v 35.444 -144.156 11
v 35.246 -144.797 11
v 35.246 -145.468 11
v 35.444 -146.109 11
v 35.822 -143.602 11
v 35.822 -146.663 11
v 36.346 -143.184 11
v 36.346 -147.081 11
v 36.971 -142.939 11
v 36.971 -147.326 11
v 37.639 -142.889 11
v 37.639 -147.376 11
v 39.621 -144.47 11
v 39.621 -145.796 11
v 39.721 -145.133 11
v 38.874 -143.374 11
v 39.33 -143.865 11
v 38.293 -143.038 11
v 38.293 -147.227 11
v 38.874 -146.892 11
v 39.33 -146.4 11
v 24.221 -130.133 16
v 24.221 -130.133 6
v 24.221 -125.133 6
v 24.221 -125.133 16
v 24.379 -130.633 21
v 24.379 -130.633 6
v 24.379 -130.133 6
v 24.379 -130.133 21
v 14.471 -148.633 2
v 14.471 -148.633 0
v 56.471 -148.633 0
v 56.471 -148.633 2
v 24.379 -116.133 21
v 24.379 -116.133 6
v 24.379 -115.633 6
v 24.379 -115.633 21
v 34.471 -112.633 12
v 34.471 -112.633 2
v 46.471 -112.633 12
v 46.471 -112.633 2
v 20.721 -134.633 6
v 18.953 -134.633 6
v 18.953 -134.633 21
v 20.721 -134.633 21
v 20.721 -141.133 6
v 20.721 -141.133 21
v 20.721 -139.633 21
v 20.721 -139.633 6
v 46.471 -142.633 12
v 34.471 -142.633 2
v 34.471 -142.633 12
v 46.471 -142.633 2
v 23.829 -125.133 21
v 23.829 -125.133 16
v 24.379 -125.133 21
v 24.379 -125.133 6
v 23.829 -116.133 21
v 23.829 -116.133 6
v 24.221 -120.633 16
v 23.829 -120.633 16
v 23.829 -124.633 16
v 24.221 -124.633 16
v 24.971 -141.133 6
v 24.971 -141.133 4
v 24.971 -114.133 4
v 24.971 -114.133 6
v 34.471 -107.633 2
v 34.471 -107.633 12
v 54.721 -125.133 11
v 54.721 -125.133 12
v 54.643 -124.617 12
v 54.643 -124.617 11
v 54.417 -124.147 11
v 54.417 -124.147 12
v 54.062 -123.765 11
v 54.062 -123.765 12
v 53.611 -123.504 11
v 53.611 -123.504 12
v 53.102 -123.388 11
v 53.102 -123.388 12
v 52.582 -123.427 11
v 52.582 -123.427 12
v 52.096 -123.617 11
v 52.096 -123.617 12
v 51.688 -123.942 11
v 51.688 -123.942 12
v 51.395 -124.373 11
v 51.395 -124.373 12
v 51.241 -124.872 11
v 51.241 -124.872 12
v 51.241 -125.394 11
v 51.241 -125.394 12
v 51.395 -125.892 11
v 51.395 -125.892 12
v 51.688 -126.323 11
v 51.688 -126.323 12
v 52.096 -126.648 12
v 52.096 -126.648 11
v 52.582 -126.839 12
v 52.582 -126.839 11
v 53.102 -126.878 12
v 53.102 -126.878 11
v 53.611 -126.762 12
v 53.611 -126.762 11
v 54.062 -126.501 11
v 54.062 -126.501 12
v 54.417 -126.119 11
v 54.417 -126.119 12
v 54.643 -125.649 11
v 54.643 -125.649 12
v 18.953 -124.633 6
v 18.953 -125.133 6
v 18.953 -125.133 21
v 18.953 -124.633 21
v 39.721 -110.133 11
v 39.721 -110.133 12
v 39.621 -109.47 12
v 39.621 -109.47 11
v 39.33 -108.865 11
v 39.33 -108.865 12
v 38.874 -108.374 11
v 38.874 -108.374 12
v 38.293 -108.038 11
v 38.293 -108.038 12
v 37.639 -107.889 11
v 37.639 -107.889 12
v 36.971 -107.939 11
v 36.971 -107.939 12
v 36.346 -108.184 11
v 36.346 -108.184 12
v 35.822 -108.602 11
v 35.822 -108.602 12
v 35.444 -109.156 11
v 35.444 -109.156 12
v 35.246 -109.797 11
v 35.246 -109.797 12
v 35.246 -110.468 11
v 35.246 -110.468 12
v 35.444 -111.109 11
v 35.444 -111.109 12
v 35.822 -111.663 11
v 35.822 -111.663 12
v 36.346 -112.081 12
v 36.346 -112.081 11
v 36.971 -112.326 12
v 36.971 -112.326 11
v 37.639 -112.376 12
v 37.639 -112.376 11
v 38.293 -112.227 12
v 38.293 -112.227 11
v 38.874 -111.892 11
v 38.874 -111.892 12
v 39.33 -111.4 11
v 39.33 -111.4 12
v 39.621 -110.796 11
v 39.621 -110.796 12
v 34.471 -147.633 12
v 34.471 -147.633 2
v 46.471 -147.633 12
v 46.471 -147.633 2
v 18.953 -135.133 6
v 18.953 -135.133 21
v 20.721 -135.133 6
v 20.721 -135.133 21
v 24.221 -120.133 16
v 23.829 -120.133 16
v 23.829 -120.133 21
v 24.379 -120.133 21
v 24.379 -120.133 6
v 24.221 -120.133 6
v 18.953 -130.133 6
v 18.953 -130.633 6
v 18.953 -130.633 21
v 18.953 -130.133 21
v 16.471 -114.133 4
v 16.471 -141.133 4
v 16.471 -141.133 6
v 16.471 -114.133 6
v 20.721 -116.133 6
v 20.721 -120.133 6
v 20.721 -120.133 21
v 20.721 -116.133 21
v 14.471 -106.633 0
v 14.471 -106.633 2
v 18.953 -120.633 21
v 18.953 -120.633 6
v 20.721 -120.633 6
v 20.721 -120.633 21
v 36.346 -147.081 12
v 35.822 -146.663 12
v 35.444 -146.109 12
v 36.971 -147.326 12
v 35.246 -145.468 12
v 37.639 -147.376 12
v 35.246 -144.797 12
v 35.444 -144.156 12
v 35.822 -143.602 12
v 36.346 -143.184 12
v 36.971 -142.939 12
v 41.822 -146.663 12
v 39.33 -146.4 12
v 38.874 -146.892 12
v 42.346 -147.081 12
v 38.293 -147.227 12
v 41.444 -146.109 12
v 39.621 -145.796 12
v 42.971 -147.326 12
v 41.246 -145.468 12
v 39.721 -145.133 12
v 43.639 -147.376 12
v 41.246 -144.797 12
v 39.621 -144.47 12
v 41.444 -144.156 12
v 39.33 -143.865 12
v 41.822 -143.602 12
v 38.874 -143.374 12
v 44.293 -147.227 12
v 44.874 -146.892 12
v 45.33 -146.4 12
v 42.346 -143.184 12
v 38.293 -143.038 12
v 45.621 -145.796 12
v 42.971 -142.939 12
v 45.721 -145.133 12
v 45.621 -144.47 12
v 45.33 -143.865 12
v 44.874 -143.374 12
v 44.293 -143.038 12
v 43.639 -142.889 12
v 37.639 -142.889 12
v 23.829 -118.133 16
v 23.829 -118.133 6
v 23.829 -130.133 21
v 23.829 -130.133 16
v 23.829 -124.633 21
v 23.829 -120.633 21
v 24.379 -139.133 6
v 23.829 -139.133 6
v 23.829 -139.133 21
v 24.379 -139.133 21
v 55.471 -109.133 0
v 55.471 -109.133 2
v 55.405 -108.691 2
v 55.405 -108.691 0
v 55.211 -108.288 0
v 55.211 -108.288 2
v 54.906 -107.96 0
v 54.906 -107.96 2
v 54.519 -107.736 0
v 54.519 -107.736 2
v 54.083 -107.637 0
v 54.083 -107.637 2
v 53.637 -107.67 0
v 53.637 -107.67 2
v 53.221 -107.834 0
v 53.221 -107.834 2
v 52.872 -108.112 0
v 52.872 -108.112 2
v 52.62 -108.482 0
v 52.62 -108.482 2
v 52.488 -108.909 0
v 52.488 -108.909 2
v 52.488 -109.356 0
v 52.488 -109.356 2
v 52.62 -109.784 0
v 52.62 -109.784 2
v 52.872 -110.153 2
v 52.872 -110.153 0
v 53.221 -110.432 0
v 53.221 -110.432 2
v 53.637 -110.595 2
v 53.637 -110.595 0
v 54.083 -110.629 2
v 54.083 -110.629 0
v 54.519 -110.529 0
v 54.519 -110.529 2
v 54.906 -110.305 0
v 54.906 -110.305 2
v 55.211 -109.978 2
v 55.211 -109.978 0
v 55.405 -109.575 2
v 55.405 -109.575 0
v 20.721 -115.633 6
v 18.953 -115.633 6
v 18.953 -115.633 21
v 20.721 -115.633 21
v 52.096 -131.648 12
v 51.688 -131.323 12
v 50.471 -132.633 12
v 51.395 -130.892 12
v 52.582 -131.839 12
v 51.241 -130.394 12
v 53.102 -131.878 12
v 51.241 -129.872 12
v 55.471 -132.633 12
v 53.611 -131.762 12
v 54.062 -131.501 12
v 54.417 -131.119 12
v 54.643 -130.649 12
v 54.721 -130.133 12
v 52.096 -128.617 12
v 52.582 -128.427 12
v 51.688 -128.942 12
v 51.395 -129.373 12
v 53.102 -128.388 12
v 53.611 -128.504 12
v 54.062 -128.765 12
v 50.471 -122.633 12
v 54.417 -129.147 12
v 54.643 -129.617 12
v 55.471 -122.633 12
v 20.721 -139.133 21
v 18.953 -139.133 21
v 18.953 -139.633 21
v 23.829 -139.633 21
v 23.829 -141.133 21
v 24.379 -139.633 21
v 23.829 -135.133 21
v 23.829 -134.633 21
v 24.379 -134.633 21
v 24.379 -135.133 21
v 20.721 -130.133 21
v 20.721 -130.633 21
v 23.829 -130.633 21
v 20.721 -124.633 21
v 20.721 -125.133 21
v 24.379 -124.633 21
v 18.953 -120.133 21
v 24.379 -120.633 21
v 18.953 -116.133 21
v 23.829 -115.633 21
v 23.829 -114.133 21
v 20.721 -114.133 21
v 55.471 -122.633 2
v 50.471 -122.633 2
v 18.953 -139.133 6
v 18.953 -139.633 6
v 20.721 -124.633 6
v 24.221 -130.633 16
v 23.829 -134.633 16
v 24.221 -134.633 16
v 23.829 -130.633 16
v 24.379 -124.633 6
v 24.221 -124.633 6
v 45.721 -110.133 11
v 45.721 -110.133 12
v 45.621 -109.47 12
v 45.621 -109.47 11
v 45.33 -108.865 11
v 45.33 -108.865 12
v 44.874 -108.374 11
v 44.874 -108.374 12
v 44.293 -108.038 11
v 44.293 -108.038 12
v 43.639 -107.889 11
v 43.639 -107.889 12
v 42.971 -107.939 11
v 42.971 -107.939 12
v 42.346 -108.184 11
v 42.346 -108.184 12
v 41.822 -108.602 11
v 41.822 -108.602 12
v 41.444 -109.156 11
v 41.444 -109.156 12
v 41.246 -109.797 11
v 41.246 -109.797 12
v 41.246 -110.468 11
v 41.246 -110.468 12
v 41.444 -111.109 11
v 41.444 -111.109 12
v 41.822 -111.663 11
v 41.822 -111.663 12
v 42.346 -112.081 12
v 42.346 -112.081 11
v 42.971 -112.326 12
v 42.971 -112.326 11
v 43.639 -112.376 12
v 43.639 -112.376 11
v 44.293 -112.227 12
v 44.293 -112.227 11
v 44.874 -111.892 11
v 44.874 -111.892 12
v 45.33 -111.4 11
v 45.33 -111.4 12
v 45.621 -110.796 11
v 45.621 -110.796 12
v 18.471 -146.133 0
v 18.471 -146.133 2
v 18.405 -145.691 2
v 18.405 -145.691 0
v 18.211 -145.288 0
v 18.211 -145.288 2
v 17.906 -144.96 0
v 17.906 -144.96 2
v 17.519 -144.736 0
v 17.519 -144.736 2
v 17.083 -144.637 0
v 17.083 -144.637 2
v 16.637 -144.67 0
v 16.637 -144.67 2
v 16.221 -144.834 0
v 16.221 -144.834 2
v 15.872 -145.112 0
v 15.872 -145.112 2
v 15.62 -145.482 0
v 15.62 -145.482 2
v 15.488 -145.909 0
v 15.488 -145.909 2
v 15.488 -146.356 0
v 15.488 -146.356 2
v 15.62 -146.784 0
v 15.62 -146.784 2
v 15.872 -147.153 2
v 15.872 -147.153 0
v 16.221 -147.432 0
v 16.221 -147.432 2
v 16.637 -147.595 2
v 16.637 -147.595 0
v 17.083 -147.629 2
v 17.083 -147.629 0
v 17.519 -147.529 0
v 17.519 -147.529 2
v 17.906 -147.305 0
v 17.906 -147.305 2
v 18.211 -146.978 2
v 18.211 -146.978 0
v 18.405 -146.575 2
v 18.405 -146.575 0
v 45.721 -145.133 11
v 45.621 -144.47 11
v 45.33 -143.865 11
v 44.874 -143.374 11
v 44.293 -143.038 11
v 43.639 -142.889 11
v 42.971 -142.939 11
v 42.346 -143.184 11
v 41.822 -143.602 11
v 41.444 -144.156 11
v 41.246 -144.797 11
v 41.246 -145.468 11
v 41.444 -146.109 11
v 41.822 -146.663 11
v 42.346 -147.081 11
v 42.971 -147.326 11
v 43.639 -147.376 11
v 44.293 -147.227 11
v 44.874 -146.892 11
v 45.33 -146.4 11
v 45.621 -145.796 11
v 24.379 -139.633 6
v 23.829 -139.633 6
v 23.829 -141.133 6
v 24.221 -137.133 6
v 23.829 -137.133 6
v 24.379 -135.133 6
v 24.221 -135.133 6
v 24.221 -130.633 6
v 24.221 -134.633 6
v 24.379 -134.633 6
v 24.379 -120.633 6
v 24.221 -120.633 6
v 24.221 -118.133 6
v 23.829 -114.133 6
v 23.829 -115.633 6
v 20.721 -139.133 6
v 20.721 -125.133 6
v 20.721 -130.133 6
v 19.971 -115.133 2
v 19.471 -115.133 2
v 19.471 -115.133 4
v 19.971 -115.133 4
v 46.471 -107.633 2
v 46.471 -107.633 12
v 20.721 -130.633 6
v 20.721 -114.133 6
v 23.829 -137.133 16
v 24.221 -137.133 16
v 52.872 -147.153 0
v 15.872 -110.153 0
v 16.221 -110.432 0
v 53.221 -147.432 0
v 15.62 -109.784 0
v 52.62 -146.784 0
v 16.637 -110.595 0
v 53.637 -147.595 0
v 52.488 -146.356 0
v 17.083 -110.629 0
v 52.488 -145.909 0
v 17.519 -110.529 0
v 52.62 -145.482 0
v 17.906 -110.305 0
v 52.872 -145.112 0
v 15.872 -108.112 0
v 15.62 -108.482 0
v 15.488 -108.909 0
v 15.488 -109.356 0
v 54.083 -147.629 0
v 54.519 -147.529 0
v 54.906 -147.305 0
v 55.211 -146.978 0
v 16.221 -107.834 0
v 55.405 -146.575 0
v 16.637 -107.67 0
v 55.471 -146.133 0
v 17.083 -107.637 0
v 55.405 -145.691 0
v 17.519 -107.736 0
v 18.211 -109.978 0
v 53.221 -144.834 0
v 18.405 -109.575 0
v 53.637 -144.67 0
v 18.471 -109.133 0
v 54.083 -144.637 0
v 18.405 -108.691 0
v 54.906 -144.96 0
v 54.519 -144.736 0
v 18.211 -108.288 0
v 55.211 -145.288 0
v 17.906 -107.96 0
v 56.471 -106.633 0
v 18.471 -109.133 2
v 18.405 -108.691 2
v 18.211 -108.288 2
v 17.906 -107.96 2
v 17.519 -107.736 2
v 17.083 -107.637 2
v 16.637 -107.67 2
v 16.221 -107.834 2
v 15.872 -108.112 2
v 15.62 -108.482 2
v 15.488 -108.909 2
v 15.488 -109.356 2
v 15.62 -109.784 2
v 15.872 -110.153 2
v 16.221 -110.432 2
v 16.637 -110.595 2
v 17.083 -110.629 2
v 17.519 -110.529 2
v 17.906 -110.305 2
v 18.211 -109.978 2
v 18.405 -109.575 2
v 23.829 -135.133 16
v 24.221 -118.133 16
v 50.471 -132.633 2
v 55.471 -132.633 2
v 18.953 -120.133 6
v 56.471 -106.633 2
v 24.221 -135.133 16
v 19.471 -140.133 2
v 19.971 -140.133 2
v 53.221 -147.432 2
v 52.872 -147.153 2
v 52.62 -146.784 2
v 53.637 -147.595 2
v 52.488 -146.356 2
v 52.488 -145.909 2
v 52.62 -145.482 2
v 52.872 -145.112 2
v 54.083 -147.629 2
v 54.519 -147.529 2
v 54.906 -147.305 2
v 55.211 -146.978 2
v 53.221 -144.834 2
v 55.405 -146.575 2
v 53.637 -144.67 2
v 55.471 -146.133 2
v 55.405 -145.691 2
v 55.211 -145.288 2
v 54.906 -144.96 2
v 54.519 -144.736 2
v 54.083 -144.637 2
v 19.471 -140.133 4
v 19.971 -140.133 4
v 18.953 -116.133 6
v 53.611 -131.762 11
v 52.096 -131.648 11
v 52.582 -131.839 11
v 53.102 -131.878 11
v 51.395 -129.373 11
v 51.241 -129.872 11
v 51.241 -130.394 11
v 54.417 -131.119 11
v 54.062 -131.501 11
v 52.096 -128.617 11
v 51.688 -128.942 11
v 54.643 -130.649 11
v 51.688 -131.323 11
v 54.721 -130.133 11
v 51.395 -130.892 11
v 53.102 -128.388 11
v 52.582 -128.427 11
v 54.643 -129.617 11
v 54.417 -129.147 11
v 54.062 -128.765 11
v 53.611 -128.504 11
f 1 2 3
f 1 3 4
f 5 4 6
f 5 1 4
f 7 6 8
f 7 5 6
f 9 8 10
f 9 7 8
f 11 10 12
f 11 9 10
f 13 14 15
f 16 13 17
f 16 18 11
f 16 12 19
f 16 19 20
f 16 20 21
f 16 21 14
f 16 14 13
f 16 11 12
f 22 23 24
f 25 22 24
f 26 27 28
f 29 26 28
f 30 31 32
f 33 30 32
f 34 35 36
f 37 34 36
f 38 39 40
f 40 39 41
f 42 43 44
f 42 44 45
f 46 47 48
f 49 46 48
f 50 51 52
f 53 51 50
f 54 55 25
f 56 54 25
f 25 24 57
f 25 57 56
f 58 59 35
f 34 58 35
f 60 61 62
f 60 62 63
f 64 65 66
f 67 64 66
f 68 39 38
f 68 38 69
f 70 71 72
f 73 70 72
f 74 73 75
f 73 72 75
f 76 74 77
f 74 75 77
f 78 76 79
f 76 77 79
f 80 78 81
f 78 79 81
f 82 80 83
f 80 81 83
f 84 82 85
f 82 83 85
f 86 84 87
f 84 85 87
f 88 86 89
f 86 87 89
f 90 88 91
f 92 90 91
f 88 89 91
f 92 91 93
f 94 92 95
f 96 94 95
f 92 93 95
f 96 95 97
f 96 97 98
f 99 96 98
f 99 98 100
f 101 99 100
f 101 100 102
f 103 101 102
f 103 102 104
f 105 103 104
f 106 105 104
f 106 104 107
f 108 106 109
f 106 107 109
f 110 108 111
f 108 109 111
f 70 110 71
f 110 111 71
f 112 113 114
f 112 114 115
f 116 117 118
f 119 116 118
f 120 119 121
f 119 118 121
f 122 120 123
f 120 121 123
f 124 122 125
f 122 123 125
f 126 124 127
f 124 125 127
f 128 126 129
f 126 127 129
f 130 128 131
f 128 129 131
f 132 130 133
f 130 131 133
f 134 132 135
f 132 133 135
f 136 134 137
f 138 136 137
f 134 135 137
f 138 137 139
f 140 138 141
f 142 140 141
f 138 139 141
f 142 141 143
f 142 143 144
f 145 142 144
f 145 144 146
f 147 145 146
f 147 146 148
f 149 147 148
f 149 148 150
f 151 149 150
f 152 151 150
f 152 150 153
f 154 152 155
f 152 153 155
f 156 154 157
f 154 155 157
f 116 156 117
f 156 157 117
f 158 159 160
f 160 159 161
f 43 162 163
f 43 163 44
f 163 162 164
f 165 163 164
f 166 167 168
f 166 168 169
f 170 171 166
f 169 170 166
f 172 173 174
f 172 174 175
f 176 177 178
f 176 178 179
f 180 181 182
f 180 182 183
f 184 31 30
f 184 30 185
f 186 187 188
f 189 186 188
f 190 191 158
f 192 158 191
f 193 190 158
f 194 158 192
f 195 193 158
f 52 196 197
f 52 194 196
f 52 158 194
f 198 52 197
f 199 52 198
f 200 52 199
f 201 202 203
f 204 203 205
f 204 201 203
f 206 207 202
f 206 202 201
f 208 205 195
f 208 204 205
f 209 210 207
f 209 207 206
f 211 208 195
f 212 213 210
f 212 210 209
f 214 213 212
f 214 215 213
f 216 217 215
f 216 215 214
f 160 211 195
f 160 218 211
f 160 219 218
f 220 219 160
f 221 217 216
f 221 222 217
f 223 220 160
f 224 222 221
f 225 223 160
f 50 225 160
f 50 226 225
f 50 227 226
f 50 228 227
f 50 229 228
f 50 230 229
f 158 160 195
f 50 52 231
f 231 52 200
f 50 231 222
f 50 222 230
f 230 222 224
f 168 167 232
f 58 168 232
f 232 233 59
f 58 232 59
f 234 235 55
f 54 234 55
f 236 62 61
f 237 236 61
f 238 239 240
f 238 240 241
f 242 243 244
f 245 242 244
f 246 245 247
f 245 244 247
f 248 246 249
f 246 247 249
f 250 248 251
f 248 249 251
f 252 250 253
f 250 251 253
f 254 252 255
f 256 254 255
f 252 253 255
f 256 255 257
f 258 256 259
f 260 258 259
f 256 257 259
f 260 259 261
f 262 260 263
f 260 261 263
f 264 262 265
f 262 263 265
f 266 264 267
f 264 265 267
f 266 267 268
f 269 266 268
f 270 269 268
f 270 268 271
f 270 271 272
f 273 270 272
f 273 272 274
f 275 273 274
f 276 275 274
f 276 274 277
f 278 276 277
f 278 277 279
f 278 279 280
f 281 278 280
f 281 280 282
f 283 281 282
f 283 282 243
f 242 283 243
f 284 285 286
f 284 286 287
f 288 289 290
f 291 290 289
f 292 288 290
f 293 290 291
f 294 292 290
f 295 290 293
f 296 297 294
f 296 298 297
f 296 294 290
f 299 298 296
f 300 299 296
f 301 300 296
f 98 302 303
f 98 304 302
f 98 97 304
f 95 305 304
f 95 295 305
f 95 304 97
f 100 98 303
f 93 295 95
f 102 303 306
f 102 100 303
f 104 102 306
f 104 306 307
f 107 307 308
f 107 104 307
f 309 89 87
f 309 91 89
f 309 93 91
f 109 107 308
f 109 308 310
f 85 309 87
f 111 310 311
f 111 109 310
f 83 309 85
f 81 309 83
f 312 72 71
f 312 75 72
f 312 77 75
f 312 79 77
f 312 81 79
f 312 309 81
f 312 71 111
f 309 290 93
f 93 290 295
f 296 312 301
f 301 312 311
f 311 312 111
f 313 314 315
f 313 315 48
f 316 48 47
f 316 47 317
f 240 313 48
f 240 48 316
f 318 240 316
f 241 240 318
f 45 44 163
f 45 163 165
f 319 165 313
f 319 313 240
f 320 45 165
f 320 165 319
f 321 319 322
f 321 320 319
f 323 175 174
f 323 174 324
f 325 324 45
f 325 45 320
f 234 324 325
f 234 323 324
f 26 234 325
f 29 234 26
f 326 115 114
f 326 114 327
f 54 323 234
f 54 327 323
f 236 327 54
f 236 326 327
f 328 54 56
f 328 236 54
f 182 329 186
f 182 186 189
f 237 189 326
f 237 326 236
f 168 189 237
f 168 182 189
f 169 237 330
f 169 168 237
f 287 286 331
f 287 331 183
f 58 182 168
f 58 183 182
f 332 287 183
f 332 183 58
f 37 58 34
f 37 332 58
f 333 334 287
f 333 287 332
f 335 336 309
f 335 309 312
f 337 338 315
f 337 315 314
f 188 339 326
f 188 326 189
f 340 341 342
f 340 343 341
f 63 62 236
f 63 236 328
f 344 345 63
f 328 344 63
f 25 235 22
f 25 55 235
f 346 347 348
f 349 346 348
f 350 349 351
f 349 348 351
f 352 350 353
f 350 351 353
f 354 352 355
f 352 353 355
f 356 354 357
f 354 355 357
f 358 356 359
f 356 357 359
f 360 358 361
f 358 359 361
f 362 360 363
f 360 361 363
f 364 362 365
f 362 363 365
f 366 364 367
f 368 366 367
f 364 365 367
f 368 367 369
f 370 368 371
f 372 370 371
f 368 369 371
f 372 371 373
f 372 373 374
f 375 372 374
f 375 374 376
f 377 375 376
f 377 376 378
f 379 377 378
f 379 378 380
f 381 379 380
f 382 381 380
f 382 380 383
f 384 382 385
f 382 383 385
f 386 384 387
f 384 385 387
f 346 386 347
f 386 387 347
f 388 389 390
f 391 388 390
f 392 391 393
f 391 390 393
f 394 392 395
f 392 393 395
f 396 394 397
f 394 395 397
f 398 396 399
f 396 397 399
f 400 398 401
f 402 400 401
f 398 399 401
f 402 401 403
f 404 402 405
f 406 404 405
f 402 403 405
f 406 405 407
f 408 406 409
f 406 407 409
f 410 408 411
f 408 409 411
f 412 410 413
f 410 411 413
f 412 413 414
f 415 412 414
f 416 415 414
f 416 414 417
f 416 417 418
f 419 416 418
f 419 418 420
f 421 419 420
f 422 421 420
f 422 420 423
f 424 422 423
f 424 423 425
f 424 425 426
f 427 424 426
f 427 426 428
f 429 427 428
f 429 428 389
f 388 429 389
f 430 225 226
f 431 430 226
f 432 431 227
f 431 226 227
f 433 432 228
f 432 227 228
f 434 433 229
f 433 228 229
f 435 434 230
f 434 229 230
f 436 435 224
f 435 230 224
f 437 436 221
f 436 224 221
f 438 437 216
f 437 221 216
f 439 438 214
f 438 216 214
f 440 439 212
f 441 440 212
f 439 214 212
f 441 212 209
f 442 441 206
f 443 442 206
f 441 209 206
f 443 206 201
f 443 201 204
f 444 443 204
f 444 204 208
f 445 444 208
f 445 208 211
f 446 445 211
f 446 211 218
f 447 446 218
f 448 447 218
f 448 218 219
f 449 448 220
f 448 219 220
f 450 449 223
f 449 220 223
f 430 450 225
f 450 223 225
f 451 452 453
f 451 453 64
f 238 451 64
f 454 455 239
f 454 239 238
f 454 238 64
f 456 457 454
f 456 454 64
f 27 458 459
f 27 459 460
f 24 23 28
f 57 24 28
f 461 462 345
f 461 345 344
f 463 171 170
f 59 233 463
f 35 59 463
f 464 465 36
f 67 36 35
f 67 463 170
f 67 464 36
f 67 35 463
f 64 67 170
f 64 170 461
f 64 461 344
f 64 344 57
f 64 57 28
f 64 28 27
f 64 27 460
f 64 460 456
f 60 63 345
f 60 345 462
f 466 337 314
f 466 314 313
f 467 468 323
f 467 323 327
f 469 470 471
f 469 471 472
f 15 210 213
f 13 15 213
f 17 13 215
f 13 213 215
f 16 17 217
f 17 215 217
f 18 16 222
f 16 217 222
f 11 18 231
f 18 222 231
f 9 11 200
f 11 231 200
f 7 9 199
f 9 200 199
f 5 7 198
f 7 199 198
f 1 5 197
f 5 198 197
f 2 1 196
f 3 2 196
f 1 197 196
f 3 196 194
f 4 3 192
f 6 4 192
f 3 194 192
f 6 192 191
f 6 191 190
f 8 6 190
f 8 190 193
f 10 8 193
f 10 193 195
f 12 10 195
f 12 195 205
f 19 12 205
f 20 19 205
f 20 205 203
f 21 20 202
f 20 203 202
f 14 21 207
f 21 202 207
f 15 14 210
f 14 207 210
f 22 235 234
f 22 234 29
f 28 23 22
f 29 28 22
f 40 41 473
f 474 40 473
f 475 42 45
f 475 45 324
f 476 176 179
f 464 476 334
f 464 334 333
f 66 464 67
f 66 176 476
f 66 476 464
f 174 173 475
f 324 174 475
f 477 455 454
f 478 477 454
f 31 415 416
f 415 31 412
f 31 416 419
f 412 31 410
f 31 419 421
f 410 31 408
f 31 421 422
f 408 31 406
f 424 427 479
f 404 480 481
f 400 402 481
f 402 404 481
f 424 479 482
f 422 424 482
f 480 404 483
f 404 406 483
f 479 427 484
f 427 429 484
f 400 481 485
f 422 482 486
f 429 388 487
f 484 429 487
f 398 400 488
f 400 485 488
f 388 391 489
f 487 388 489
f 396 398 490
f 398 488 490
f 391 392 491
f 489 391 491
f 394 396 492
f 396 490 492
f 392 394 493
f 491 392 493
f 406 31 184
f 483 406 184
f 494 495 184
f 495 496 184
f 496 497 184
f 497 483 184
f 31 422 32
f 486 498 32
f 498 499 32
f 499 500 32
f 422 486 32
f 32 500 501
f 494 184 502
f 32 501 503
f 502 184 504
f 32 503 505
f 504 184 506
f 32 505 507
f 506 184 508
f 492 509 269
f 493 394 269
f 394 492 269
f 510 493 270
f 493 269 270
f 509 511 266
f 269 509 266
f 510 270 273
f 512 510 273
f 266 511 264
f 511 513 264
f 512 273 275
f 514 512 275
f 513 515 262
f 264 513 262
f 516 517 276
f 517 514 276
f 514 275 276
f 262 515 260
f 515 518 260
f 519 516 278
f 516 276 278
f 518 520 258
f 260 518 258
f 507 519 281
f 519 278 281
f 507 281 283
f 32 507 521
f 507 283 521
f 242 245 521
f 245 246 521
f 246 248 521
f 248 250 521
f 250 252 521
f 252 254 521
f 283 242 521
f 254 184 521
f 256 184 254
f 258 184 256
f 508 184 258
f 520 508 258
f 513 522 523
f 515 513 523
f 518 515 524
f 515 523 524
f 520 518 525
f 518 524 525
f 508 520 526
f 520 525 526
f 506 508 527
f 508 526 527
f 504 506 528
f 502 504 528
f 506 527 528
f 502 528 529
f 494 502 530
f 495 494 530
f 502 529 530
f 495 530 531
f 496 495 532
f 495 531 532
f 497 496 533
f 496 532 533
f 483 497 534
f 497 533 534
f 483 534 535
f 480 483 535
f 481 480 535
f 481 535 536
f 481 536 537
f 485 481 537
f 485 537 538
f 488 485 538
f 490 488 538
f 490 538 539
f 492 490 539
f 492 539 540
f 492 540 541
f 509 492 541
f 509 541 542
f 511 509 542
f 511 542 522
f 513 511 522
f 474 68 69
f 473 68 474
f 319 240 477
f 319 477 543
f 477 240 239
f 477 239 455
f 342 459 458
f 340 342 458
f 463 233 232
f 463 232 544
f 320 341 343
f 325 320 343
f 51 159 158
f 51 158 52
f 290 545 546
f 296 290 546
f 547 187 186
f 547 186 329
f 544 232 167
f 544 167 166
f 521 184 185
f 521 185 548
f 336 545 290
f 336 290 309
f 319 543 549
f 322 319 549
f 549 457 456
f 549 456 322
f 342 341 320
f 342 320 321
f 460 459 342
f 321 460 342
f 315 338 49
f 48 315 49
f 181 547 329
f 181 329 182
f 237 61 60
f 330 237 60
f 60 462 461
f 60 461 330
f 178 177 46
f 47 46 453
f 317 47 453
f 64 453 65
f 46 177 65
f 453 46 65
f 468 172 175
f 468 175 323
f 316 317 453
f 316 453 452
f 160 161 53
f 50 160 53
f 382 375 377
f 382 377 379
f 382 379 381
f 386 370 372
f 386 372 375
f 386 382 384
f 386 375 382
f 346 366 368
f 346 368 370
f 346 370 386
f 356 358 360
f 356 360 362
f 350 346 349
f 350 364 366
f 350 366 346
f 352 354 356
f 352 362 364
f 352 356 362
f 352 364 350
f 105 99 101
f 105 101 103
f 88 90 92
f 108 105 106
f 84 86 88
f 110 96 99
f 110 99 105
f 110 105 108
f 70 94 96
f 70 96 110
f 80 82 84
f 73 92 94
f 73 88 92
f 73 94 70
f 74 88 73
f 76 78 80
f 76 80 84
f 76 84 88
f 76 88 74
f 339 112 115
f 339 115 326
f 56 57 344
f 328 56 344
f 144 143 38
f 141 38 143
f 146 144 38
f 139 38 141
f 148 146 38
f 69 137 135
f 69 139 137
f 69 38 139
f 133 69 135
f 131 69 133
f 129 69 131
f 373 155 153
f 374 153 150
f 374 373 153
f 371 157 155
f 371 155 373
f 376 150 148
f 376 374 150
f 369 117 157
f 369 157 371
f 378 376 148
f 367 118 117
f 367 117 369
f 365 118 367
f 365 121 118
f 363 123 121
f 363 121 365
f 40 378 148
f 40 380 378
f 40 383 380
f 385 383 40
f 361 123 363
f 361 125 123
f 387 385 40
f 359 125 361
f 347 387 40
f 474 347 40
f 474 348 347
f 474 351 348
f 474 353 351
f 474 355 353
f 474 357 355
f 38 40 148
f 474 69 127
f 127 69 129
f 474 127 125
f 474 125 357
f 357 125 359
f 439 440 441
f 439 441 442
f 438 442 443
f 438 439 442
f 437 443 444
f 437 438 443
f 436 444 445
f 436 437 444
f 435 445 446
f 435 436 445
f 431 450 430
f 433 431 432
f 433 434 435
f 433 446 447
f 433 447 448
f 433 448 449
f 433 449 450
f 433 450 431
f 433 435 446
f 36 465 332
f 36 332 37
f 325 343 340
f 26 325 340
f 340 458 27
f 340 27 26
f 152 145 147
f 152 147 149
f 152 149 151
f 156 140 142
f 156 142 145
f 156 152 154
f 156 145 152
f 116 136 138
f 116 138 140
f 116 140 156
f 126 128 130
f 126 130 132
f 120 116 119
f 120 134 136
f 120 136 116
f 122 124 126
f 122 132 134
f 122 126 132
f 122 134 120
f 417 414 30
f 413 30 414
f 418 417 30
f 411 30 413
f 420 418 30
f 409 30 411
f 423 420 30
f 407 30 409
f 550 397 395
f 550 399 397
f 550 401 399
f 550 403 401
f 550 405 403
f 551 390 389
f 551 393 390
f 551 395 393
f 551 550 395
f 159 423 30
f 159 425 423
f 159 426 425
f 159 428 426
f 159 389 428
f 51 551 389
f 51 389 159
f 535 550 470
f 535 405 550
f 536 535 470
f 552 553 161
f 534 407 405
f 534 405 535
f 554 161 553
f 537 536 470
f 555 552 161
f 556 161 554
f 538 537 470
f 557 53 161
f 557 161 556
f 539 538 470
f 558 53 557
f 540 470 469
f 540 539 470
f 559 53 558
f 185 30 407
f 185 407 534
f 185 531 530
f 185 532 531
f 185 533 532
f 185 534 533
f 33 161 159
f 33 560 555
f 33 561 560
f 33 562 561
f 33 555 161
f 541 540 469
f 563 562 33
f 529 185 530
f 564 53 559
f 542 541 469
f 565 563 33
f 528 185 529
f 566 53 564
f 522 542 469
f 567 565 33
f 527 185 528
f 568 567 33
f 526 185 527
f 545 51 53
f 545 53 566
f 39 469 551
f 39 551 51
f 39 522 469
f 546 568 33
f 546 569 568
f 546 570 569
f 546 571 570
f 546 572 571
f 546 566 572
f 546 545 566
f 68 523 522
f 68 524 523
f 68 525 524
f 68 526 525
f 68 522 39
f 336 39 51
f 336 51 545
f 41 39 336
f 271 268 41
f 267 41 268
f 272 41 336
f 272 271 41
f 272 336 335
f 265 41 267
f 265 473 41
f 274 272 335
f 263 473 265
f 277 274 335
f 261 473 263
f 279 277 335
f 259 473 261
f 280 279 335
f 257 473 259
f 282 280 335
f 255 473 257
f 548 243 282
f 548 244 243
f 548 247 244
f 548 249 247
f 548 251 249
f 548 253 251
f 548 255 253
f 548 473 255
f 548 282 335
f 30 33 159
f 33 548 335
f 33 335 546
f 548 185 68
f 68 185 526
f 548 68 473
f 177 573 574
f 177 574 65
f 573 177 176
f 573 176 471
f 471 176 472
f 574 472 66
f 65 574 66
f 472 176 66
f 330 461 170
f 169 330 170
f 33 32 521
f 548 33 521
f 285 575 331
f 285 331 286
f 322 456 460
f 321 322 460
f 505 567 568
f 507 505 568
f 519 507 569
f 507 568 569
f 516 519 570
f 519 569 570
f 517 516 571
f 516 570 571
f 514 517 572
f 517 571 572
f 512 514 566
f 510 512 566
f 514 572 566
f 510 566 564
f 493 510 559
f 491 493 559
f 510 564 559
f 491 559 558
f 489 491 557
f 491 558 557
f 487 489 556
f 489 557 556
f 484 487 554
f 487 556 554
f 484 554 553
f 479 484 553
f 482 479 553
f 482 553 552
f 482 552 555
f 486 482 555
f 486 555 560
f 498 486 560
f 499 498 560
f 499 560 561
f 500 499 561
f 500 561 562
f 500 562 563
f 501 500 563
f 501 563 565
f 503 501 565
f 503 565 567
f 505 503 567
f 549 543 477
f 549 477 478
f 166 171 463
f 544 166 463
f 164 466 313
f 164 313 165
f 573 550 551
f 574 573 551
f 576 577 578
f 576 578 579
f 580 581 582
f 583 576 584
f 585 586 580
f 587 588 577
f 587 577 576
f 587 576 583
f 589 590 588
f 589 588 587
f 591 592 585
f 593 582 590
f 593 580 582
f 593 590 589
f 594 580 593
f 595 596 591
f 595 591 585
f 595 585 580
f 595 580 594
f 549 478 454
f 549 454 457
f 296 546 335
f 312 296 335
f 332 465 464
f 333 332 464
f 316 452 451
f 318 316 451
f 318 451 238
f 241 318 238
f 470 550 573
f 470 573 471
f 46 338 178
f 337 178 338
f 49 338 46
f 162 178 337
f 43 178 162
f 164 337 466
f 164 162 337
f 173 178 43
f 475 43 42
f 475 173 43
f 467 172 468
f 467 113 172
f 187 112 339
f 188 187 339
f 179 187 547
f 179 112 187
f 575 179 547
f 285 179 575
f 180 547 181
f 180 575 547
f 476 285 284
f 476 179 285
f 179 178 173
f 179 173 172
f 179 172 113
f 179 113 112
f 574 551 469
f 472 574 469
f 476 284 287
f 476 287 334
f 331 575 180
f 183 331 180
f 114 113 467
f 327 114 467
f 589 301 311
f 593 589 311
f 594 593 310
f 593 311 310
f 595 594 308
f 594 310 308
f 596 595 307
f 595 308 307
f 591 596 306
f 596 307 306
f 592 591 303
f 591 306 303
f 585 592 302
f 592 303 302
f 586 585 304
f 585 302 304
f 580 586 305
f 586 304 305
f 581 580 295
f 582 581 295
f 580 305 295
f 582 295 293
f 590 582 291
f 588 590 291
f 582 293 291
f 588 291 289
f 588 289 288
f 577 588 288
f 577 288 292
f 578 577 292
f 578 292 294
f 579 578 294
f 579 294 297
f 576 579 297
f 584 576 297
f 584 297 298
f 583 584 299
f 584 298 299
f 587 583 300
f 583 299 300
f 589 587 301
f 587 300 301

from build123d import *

# Parameters (mm, degrees)
SKETCH1_W           = 42
SKETCH1_H           = 42
BOSS_EXTRUDE1_DEPTH = 2
SKETCH2_W           = 0.5
SKETCH2_H           = 25
BOSS_EXTRUDE2_DEPTH = 2
SKETCH4_W           = 8.5
SKETCH4_H           = 27
BOSS_EXTRUDE3_DEPTH = 2
SKETCH5_W           = 5.42648105
SKETCH5_H           = 0.5
BOSS_EXTRUDE4_DEPTH = 15
SKETCH6_W           = 3.107576182
SKETCH6_H           = 27
BOSS_EXTRUDE5_DEPTH = 15
SKETCH7_W           = 2.5
SKETCH7_H           = 19
BOSS_EXTRUDE6_DEPTH = 10
SKETCH8_W           = 12
SKETCH8_H           = 5
SKETCH8_W_2         = 5
SKETCH8_H_2         = 10
BOSS_EXTRUDE7_DEPTH = 10
SKETCH9_R           = 2.25
SKETCH9_R_2         = 1.75
CUT_EXTRUDE1_DEPTH  = 1
SKETCH10_R          = 1.5
CUT_EXTRUDE2_DEPTH  = 3


with BuildPart() as part:
    # Sketch1 → Boss-Extrude1 (new body)
    with BuildSketch(Plane.XY):
        with Locations((35.471214637, -127.632705913)):
            Rectangle(SKETCH1_W, SKETCH1_H)
    extrude(amount=BOSS_EXTRUDE1_DEPTH)

    # Sketch2 → Boss-Extrude2 (add)
    with BuildSketch(Plane.XY.offset(2)):
        with Locations((19.721214637, -127.632705913)):
            Rectangle(SKETCH2_W, SKETCH2_H)
    extrude(amount=BOSS_EXTRUDE2_DEPTH)

    # Sketch4 → Boss-Extrude3 (add)
    with BuildSketch(Plane.XY.offset(4)):
        with Locations((20.721214637, -127.632705913)):
            Rectangle(SKETCH4_W, SKETCH4_H)
    extrude(amount=BOSS_EXTRUDE3_DEPTH)

    # Sketch5 → Boss-Extrude4 (add)
    with BuildSketch(Plane.XY.offset(6)):
        with Locations((21.665849022, -115.882705913)):
            Rectangle(SKETCH5_W, SKETCH5_H)
        with Locations((21.665849022, -120.382705913)):
            Rectangle(SKETCH5_W, SKETCH5_H)
        with Locations((21.665849022, -124.882705913)):
            Rectangle(SKETCH5_W, SKETCH5_H)
        with Locations((21.665849022, -130.382705913)):
            Rectangle(SKETCH5_W, SKETCH5_H)
        with Locations((21.665849022, -134.882705913)):
            Rectangle(SKETCH5_W, SKETCH5_H)
        with Locations((21.665849022, -139.382705913)):
            Rectangle(SKETCH5_W, SKETCH5_H)
    extrude(amount=BOSS_EXTRUDE4_DEPTH)

    # Sketch6 → Boss-Extrude5 (add)
    with BuildSketch(Plane.XY.offset(6)):
        with Locations((22.275002728, -127.632705913)):
            Rectangle(SKETCH6_W, SKETCH6_H)
    extrude(amount=BOSS_EXTRUDE5_DEPTH)

    # Sketch7 → Boss-Extrude6 (add)
    with BuildSketch(Plane.XY.offset(6)):
        with Locations((22.971214637, -127.632705913)):
            Rectangle(SKETCH7_W, SKETCH7_H)
    extrude(amount=BOSS_EXTRUDE6_DEPTH)

    # Sketch8 → Boss-Extrude7 (add)
    with BuildSketch(Plane.XY.offset(2)):
        with Locations((40.471214637, -110.132705913)):
            Rectangle(SKETCH8_W, SKETCH8_H)
        with Locations((40.471214637, -145.132705913)):
            Rectangle(SKETCH8_W, SKETCH8_H)
        with Locations((52.971214637, -127.632705913)):
            Rectangle(SKETCH8_W_2, SKETCH8_H_2)
    extrude(amount=BOSS_EXTRUDE7_DEPTH)

    # Sketch9 → Cut-Extrude1 (cut)
    with BuildSketch(Plane.XY.offset(12)):
        with Locations((37.471214637, -110.132705913)):
            Circle(SKETCH9_R)
        with Locations((43.471214637, -110.132705913)):
            Circle(SKETCH9_R)
        with Locations((52.971214637, -125.132705913)):
            Circle(SKETCH9_R_2)
        with Locations((52.971214637, -130.132705913)):
            Circle(SKETCH9_R_2)
        with Locations((43.471214637, -145.132705913)):
            Circle(SKETCH9_R)
        with Locations((37.471214637, -145.132705913)):
            Circle(SKETCH9_R)
    extrude(amount=-CUT_EXTRUDE1_DEPTH, mode=Mode.SUBTRACT)

    # Sketch10 → Cut-Extrude2 (cut, through all)
    with BuildSketch(Plane.XY.offset(2)):
        with Locations((53.971214637, -109.132705913)):
            Circle(SKETCH10_R)
        with Locations((16.971214637, -109.132705913)):
            Circle(SKETCH10_R)
        with Locations((16.971214637, -146.132705913)):
            Circle(SKETCH10_R)
        with Locations((53.971214637, -146.132705913)):
            Circle(SKETCH10_R)
    extrude(amount=-CUT_EXTRUDE2_DEPTH, mode=Mode.SUBTRACT)


solid = part.part
